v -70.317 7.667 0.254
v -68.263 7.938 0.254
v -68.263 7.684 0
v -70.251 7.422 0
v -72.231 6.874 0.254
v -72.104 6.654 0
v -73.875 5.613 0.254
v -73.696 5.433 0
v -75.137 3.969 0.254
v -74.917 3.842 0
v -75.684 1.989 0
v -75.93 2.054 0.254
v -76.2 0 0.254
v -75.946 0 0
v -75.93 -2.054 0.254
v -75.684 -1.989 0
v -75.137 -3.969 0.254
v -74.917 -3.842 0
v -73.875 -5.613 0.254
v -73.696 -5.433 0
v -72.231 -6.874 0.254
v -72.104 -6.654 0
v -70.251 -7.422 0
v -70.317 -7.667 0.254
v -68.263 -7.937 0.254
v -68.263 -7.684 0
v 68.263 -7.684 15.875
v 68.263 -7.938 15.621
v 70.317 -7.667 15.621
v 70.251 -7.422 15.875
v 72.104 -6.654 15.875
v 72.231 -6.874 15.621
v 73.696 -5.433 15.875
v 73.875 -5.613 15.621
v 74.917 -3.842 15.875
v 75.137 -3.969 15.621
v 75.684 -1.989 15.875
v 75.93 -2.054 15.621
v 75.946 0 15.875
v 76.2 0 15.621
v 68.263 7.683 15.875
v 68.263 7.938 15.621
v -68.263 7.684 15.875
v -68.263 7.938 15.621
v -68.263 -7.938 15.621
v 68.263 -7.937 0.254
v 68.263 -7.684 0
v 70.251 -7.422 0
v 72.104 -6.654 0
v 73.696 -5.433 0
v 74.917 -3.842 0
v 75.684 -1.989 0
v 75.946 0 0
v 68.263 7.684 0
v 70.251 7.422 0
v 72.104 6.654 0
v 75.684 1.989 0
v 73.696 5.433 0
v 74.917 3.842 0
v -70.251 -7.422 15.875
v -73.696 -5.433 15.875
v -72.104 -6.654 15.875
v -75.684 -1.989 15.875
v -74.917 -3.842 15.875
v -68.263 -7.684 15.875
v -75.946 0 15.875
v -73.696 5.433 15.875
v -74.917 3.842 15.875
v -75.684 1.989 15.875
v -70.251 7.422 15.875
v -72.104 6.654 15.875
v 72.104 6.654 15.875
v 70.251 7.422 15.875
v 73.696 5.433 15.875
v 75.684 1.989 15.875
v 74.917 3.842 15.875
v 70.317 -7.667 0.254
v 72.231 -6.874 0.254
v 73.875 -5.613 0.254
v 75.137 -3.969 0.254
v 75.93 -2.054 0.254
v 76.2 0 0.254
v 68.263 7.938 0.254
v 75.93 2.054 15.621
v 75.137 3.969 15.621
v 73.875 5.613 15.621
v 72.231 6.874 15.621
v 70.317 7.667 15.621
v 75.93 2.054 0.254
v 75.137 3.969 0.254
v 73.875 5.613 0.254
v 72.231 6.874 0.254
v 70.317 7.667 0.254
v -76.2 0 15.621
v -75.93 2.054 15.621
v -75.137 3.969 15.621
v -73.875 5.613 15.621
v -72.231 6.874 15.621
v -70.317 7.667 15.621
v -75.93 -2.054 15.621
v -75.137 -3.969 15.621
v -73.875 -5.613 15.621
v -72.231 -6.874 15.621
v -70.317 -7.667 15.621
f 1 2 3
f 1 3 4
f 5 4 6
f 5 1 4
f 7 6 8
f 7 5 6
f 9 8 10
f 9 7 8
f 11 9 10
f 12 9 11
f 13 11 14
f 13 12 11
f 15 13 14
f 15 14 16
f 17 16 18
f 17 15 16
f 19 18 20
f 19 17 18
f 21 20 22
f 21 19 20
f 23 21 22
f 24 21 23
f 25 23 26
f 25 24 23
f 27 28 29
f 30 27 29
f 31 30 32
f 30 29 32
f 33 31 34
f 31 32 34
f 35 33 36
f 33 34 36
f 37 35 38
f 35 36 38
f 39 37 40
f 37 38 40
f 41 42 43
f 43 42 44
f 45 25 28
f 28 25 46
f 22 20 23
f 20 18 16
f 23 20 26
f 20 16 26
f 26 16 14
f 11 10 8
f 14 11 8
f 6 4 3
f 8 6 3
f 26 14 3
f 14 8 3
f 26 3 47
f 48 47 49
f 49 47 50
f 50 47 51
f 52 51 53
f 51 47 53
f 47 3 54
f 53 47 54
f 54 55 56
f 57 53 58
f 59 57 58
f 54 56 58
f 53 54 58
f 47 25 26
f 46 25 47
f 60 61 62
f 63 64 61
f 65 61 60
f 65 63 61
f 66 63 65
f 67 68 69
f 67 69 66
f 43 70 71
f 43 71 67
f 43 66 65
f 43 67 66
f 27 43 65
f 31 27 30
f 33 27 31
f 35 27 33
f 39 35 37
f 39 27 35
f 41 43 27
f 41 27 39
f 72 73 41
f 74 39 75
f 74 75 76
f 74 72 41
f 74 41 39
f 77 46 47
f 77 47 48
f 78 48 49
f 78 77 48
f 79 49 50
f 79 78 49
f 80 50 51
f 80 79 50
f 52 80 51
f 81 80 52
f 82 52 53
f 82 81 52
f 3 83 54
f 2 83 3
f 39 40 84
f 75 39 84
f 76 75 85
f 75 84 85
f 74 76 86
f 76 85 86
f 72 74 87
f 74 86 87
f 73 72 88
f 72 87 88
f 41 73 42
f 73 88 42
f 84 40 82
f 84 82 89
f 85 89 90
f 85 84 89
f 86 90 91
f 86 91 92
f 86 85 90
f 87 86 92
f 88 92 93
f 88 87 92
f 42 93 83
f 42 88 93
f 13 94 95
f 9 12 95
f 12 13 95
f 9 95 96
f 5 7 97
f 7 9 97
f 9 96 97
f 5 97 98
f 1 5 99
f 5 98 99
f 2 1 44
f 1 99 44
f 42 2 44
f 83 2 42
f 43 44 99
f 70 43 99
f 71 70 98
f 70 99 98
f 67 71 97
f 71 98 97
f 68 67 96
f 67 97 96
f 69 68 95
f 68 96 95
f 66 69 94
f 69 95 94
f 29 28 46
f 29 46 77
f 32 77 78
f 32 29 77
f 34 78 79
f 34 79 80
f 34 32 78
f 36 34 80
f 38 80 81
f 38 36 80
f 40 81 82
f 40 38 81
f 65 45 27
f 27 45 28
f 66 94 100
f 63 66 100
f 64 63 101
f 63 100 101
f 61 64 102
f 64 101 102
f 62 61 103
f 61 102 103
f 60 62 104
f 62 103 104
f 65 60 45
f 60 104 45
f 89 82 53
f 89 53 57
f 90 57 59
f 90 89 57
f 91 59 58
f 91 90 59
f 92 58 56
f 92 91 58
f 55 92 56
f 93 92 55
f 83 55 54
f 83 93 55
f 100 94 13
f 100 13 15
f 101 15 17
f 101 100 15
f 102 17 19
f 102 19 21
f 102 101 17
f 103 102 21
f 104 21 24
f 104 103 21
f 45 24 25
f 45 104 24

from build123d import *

# Parameters (mm, degrees)
F0_W     = 152.4
F0_H     = 15.875
F1_DEPTH = 15.875
F2_R     = 7.93749
F3_SIZE  = 0.254


# Not quite as in the source:
# - a fillet or chamfer is up to 0.001 mm smaller than in the source, because OpenCascade refuses the exact size


with BuildPart() as f1:
    # F0 (on Top) → F1 (new body)
    with BuildSketch(Plane.XY):
        Rectangle(F0_W, F0_H)
    extrude(amount=F1_DEPTH)

    # F2 (radius 7.9375 in the source; OpenCascade refuses exactly that, so slightly less here)
    f2_edges = [f1.edges().sort_by_distance(p)[0] for p in [
        (-76.2, 7.9375, 7.9375),
        (-76.2, -7.9375, 7.9375),
        (76.2, -7.9375, 7.9375),
        (76.2, 7.9375, 7.9375),
    ]]
    fillet(f2_edges, radius=F2_R)

    # F3
    f3_edges = [f1.edges().sort_by_distance(p)[0] for p in [
        (0, -7.9375, 0),
        (-73.875163, -5.612663, 0),
        (73.875163, -5.612663, 0),
        (-76.2, 0, 0),
        (76.2, 0, 0),
        (-73.875163, 5.612663, 0),
        (73.875163, 5.612663, 0),
        (0, 7.9375, 0),
        (0, -7.9375, 15.875),
        (-73.875163, -5.612663, 15.875),
        (73.875163, -5.612663, 15.875),
        (-76.2, 0, 15.875),
        (76.2, 0, 15.875),
        (-73.875163, 5.612663, 15.875),
        (73.875163, 5.612663, 15.875),
        (0, 7.9375, 15.875),
    ]]
    chamfer(f3_edges, length=F3_SIZE)


solid = f1.part
